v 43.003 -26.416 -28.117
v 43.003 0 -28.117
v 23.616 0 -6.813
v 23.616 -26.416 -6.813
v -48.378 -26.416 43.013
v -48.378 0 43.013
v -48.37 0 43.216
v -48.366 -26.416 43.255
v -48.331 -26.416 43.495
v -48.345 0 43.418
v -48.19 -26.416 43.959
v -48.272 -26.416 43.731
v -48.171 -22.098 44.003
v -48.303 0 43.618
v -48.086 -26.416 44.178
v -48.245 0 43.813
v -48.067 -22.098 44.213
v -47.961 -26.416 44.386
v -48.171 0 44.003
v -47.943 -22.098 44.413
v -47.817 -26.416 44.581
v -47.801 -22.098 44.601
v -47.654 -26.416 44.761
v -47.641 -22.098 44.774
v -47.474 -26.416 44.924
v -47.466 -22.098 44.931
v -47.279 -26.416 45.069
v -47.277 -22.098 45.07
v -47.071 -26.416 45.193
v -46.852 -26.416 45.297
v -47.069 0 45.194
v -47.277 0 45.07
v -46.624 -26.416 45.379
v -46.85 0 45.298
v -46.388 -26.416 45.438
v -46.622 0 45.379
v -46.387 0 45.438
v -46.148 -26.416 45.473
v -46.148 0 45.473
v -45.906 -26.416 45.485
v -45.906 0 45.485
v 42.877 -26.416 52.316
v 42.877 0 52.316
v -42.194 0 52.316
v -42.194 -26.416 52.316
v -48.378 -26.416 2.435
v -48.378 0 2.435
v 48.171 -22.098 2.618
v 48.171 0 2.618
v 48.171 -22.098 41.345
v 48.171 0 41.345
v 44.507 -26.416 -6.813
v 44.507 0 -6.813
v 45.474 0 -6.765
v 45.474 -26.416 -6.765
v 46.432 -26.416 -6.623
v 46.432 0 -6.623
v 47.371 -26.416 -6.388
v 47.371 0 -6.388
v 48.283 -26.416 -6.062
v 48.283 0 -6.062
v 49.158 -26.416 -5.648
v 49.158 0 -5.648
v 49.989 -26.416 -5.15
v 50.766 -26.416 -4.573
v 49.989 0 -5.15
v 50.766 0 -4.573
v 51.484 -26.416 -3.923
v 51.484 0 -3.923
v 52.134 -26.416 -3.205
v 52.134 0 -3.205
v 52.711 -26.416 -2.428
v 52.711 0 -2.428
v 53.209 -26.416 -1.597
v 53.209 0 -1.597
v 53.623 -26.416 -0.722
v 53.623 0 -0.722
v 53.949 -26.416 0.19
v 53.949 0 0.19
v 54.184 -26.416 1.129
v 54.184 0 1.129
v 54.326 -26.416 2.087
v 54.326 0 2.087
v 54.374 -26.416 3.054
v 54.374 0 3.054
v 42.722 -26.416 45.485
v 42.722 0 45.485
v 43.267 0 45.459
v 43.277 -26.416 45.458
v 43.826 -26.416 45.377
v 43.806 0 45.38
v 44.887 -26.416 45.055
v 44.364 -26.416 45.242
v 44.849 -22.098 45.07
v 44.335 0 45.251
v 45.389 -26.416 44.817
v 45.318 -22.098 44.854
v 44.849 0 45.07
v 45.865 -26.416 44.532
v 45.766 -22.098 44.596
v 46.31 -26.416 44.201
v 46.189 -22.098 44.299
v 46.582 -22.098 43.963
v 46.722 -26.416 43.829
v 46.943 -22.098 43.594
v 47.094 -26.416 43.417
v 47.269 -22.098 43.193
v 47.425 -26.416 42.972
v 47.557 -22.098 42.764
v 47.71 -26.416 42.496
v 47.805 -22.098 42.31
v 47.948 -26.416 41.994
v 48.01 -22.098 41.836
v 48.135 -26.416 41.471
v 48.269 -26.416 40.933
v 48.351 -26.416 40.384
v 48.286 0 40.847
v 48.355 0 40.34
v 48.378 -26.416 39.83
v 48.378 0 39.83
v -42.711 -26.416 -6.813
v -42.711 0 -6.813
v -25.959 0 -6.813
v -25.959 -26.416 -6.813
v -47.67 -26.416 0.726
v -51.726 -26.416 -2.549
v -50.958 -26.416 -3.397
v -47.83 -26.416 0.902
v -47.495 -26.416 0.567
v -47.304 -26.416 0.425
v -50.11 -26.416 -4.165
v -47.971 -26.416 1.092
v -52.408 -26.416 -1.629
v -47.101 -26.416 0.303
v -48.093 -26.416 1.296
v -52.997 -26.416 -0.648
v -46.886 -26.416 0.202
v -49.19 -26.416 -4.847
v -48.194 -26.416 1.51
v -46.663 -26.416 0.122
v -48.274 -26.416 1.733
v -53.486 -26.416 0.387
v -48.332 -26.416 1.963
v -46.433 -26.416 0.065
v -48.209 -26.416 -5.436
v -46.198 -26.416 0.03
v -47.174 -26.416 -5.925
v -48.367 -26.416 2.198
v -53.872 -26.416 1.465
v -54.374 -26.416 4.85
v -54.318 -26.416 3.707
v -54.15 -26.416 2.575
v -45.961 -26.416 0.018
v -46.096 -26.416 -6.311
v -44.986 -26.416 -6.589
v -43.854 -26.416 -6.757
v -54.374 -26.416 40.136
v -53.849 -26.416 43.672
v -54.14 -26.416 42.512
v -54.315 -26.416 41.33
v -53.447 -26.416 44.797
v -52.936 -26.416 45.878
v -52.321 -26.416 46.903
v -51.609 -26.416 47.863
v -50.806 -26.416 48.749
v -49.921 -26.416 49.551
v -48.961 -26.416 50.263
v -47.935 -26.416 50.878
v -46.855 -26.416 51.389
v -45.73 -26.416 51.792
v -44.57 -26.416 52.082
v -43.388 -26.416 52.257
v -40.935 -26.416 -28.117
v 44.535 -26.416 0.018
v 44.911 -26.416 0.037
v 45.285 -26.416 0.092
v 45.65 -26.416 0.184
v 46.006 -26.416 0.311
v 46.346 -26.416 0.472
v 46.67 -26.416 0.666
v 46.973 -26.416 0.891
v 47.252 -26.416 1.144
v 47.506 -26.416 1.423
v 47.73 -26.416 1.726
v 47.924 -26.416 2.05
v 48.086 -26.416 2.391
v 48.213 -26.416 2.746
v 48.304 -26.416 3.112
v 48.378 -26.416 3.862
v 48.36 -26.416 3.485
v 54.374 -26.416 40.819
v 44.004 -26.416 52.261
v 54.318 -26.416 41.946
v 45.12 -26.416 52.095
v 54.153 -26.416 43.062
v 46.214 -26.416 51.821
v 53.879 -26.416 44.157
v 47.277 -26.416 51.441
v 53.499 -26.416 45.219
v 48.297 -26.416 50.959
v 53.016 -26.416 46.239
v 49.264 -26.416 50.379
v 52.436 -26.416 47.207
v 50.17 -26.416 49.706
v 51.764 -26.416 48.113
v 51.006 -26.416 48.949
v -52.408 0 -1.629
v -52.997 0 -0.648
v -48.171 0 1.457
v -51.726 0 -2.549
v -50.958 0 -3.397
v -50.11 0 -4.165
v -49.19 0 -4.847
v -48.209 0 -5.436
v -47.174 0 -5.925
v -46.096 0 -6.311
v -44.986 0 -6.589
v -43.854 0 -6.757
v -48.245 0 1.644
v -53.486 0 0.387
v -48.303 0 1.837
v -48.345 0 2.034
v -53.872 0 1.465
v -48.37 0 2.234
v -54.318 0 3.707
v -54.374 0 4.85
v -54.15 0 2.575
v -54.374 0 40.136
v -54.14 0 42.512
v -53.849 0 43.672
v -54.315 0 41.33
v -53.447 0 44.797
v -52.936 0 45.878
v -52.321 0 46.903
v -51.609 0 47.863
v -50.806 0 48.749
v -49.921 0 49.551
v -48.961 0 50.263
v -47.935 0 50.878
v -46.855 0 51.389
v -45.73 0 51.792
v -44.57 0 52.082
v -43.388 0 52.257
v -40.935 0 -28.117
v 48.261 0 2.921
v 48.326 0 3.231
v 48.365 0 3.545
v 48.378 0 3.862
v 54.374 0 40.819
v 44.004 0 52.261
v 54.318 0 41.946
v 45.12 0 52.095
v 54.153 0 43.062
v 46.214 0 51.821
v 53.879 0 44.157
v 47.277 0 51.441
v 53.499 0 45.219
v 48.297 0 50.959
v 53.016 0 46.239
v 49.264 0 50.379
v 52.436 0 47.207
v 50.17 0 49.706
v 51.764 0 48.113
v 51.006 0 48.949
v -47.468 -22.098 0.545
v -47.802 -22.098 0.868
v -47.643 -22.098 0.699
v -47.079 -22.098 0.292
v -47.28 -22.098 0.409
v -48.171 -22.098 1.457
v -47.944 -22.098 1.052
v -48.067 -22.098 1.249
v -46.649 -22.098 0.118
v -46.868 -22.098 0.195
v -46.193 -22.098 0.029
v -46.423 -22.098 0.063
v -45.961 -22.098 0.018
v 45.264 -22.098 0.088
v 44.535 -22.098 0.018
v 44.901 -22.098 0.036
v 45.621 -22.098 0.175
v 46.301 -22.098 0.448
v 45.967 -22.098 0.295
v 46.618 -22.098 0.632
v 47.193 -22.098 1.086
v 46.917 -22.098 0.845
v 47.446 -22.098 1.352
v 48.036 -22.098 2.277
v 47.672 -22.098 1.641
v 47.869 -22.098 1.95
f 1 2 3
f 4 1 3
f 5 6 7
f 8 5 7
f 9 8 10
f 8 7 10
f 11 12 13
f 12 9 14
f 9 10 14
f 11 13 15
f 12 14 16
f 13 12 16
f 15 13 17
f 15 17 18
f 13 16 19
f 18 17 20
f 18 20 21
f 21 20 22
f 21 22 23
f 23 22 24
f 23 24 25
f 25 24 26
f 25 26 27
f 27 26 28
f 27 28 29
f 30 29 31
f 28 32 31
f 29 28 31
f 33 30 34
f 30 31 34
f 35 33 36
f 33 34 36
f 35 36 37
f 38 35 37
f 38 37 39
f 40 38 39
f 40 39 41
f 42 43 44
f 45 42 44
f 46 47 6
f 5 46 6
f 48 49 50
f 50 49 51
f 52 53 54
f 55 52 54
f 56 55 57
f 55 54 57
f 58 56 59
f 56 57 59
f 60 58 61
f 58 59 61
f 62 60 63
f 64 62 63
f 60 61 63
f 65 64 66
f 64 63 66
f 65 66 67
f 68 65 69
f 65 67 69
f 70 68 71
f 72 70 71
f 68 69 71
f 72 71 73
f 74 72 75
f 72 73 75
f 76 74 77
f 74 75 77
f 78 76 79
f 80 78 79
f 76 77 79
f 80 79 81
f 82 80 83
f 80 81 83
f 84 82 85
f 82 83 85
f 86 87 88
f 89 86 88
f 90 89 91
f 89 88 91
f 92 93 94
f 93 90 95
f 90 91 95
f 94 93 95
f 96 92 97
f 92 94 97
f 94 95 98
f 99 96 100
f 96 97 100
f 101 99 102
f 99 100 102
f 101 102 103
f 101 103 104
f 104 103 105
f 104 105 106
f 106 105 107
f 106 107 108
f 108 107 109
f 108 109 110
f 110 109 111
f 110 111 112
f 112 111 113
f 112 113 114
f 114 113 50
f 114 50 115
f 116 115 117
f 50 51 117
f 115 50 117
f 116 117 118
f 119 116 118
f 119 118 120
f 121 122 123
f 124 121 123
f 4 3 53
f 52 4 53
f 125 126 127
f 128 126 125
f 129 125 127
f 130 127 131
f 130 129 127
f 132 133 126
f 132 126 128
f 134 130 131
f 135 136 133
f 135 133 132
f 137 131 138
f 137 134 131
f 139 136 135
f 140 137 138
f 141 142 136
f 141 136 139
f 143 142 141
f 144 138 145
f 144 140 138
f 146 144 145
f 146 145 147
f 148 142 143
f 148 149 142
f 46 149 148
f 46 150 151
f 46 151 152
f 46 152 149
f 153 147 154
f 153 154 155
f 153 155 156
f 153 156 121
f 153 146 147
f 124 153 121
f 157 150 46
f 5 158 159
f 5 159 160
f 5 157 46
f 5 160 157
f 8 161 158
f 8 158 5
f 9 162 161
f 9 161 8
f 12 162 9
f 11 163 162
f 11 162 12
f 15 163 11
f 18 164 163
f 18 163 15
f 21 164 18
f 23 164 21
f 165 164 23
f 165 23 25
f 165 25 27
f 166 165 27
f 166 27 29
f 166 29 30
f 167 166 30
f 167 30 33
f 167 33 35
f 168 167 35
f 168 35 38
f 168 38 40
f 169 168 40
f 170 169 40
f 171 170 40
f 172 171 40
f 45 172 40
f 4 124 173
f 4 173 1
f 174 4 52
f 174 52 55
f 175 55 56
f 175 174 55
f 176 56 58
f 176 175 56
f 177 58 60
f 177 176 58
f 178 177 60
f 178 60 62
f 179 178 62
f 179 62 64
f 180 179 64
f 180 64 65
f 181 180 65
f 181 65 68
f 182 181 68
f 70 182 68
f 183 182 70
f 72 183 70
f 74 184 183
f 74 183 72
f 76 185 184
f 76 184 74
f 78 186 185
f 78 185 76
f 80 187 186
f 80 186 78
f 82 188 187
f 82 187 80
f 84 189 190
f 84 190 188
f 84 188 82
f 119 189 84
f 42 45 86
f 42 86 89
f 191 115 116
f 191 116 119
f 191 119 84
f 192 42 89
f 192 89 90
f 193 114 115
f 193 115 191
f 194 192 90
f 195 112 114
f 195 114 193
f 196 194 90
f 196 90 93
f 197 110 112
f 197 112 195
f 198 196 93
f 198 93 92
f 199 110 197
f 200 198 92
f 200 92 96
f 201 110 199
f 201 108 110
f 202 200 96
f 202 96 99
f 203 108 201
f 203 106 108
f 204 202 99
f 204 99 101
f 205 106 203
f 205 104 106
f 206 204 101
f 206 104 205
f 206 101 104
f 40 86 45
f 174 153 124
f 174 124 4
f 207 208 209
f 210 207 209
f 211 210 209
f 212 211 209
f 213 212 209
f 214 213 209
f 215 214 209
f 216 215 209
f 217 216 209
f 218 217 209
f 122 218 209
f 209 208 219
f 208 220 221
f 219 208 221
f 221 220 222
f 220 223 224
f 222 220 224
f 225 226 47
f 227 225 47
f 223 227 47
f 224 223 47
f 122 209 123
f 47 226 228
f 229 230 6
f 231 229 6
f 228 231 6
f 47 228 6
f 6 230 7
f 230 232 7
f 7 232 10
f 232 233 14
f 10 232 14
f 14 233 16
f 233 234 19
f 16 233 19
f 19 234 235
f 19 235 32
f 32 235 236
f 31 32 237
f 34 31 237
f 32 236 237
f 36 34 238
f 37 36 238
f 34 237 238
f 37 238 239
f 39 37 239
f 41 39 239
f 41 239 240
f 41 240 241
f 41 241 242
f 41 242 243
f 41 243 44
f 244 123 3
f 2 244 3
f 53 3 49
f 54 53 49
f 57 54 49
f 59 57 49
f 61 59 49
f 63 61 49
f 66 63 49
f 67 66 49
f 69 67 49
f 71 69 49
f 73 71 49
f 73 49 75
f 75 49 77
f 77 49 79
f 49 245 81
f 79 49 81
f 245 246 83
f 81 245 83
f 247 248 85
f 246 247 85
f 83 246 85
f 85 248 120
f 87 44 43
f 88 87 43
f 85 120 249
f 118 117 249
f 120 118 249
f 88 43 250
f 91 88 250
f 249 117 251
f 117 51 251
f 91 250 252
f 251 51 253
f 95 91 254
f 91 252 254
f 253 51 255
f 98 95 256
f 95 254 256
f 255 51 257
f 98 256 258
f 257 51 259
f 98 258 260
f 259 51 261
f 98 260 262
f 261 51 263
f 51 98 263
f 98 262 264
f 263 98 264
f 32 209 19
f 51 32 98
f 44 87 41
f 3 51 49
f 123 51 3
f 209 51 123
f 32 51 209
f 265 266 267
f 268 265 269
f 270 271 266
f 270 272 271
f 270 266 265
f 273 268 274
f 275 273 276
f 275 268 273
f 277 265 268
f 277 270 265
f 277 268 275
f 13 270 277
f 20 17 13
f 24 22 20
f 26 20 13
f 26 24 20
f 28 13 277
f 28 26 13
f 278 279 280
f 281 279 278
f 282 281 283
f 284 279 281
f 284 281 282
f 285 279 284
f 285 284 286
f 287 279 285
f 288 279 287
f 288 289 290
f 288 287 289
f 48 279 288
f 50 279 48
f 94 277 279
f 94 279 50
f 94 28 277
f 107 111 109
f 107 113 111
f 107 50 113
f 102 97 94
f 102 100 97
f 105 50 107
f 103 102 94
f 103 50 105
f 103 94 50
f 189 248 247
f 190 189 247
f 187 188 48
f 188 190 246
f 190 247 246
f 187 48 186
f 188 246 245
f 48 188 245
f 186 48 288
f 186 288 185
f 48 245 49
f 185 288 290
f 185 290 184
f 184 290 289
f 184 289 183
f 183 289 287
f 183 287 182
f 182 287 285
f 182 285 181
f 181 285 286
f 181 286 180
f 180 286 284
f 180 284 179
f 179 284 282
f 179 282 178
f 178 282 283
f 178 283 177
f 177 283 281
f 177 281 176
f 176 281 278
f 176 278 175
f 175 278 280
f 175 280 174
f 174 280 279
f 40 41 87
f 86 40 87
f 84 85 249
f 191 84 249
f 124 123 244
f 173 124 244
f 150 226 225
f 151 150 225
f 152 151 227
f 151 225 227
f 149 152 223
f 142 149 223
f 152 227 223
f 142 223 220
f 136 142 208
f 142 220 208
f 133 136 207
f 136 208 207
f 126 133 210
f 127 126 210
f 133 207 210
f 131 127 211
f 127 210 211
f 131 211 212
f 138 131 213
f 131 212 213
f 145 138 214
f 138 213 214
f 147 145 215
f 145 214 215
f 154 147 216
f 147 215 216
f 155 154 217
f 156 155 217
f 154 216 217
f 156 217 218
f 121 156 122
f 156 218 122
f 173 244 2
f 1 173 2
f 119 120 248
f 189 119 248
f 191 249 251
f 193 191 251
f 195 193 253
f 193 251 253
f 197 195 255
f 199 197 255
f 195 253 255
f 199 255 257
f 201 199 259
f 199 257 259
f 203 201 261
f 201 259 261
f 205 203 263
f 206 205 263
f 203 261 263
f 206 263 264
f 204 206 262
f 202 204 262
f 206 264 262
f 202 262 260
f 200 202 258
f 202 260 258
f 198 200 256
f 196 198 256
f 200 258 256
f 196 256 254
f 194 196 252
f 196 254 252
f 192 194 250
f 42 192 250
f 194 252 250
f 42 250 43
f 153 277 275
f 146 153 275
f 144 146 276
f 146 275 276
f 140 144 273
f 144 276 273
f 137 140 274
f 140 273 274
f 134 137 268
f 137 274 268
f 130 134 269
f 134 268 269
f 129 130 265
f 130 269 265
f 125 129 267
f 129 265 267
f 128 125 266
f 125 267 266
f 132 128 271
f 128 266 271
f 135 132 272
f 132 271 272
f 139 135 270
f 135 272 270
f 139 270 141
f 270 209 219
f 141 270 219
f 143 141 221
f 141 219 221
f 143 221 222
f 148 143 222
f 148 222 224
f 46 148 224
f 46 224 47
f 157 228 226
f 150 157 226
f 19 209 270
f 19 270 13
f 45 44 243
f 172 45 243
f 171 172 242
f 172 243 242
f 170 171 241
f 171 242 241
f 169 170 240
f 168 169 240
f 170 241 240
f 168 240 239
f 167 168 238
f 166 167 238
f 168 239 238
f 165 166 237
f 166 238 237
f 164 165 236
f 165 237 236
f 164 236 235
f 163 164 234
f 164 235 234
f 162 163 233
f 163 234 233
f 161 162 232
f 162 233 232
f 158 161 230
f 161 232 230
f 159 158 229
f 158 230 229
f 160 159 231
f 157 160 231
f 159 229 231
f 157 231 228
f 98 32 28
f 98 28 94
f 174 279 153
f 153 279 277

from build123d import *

# Parameters (mm, degrees)
F1_DEPTH = 26.416
F2_W     = 96.342794
F2_H     = 45.070231
F3_DEPTH = 22.098


with BuildPart() as f1:
    # F0 (on Front) → F1 (new body)
    with BuildSketch(Plane.XZ):
        with BuildLine():
            Line((42.877077, 52.316071), (-42.193984, 52.316071))
            ThreePointArc((-42.193984, 52.316071), (-50.806357, 48.748709), (-54.373719, 40.136336))
            Line((-54.373719, 40.136336), (-54.373719, 4.850378))
            ThreePointArc((-54.373719, 4.850378), (-50.957663, -3.396709), (-42.710576, -6.812765))
            Line((-42.710576, -6.812765), (-25.95896, -6.812765))
            Line((-25.95896, -6.812765), (23.615748, -6.812765))
            Line((23.615748, -6.812765), (44.507051, -6.812765))
            ThreePointArc((44.507051, -6.812765), (51.483839, -3.922885), (54.373719, 3.053903))
            Line((54.373719, 3.053903), (54.373719, 40.81943))
            ThreePointArc((54.373719, 40.81943), (51.006431, 48.948783), (42.877077, 52.316071))
        make_face()
        with BuildLine():
            ThreePointArc((-48.378143, 43.012887), (-47.65402, 44.761075), (-45.905832, 45.485198))
            Line((-45.905832, 45.485198), (42.722448, 45.485198))
            ThreePointArc((42.722448, 45.485198), (46.721629, 43.828684), (48.378143, 39.829503))
            Line((48.378143, 39.829503), (48.378143, 3.861538))
            ThreePointArc((48.378143, 3.861538), (47.252429, 1.143823), (44.534713, 0.018108))
            Line((44.534713, 0.018108), (-45.961362, 0.018108))
            ThreePointArc((-45.961362, 0.018108), (-47.670285, 0.725967), (-48.378143, 2.434889))
            Line((-48.378143, 2.434889), (-48.378143, 43.012887))
        make_face(mode=Mode.SUBTRACT)
        Polygon((23.615748, -6.812765), (-25.95896, -6.812765), (-40.935349, -28.11721), (43.002788, -28.11721), align=None)
    extrude(amount=F1_DEPTH)

    # F2 (on Front) → F3 (join)
    with BuildSketch(Plane.XZ):
        with Locations((0, 22.535115)):
            Rectangle(F2_W, F2_H)
    extrude(amount=F3_DEPTH)


solid = f1.part
